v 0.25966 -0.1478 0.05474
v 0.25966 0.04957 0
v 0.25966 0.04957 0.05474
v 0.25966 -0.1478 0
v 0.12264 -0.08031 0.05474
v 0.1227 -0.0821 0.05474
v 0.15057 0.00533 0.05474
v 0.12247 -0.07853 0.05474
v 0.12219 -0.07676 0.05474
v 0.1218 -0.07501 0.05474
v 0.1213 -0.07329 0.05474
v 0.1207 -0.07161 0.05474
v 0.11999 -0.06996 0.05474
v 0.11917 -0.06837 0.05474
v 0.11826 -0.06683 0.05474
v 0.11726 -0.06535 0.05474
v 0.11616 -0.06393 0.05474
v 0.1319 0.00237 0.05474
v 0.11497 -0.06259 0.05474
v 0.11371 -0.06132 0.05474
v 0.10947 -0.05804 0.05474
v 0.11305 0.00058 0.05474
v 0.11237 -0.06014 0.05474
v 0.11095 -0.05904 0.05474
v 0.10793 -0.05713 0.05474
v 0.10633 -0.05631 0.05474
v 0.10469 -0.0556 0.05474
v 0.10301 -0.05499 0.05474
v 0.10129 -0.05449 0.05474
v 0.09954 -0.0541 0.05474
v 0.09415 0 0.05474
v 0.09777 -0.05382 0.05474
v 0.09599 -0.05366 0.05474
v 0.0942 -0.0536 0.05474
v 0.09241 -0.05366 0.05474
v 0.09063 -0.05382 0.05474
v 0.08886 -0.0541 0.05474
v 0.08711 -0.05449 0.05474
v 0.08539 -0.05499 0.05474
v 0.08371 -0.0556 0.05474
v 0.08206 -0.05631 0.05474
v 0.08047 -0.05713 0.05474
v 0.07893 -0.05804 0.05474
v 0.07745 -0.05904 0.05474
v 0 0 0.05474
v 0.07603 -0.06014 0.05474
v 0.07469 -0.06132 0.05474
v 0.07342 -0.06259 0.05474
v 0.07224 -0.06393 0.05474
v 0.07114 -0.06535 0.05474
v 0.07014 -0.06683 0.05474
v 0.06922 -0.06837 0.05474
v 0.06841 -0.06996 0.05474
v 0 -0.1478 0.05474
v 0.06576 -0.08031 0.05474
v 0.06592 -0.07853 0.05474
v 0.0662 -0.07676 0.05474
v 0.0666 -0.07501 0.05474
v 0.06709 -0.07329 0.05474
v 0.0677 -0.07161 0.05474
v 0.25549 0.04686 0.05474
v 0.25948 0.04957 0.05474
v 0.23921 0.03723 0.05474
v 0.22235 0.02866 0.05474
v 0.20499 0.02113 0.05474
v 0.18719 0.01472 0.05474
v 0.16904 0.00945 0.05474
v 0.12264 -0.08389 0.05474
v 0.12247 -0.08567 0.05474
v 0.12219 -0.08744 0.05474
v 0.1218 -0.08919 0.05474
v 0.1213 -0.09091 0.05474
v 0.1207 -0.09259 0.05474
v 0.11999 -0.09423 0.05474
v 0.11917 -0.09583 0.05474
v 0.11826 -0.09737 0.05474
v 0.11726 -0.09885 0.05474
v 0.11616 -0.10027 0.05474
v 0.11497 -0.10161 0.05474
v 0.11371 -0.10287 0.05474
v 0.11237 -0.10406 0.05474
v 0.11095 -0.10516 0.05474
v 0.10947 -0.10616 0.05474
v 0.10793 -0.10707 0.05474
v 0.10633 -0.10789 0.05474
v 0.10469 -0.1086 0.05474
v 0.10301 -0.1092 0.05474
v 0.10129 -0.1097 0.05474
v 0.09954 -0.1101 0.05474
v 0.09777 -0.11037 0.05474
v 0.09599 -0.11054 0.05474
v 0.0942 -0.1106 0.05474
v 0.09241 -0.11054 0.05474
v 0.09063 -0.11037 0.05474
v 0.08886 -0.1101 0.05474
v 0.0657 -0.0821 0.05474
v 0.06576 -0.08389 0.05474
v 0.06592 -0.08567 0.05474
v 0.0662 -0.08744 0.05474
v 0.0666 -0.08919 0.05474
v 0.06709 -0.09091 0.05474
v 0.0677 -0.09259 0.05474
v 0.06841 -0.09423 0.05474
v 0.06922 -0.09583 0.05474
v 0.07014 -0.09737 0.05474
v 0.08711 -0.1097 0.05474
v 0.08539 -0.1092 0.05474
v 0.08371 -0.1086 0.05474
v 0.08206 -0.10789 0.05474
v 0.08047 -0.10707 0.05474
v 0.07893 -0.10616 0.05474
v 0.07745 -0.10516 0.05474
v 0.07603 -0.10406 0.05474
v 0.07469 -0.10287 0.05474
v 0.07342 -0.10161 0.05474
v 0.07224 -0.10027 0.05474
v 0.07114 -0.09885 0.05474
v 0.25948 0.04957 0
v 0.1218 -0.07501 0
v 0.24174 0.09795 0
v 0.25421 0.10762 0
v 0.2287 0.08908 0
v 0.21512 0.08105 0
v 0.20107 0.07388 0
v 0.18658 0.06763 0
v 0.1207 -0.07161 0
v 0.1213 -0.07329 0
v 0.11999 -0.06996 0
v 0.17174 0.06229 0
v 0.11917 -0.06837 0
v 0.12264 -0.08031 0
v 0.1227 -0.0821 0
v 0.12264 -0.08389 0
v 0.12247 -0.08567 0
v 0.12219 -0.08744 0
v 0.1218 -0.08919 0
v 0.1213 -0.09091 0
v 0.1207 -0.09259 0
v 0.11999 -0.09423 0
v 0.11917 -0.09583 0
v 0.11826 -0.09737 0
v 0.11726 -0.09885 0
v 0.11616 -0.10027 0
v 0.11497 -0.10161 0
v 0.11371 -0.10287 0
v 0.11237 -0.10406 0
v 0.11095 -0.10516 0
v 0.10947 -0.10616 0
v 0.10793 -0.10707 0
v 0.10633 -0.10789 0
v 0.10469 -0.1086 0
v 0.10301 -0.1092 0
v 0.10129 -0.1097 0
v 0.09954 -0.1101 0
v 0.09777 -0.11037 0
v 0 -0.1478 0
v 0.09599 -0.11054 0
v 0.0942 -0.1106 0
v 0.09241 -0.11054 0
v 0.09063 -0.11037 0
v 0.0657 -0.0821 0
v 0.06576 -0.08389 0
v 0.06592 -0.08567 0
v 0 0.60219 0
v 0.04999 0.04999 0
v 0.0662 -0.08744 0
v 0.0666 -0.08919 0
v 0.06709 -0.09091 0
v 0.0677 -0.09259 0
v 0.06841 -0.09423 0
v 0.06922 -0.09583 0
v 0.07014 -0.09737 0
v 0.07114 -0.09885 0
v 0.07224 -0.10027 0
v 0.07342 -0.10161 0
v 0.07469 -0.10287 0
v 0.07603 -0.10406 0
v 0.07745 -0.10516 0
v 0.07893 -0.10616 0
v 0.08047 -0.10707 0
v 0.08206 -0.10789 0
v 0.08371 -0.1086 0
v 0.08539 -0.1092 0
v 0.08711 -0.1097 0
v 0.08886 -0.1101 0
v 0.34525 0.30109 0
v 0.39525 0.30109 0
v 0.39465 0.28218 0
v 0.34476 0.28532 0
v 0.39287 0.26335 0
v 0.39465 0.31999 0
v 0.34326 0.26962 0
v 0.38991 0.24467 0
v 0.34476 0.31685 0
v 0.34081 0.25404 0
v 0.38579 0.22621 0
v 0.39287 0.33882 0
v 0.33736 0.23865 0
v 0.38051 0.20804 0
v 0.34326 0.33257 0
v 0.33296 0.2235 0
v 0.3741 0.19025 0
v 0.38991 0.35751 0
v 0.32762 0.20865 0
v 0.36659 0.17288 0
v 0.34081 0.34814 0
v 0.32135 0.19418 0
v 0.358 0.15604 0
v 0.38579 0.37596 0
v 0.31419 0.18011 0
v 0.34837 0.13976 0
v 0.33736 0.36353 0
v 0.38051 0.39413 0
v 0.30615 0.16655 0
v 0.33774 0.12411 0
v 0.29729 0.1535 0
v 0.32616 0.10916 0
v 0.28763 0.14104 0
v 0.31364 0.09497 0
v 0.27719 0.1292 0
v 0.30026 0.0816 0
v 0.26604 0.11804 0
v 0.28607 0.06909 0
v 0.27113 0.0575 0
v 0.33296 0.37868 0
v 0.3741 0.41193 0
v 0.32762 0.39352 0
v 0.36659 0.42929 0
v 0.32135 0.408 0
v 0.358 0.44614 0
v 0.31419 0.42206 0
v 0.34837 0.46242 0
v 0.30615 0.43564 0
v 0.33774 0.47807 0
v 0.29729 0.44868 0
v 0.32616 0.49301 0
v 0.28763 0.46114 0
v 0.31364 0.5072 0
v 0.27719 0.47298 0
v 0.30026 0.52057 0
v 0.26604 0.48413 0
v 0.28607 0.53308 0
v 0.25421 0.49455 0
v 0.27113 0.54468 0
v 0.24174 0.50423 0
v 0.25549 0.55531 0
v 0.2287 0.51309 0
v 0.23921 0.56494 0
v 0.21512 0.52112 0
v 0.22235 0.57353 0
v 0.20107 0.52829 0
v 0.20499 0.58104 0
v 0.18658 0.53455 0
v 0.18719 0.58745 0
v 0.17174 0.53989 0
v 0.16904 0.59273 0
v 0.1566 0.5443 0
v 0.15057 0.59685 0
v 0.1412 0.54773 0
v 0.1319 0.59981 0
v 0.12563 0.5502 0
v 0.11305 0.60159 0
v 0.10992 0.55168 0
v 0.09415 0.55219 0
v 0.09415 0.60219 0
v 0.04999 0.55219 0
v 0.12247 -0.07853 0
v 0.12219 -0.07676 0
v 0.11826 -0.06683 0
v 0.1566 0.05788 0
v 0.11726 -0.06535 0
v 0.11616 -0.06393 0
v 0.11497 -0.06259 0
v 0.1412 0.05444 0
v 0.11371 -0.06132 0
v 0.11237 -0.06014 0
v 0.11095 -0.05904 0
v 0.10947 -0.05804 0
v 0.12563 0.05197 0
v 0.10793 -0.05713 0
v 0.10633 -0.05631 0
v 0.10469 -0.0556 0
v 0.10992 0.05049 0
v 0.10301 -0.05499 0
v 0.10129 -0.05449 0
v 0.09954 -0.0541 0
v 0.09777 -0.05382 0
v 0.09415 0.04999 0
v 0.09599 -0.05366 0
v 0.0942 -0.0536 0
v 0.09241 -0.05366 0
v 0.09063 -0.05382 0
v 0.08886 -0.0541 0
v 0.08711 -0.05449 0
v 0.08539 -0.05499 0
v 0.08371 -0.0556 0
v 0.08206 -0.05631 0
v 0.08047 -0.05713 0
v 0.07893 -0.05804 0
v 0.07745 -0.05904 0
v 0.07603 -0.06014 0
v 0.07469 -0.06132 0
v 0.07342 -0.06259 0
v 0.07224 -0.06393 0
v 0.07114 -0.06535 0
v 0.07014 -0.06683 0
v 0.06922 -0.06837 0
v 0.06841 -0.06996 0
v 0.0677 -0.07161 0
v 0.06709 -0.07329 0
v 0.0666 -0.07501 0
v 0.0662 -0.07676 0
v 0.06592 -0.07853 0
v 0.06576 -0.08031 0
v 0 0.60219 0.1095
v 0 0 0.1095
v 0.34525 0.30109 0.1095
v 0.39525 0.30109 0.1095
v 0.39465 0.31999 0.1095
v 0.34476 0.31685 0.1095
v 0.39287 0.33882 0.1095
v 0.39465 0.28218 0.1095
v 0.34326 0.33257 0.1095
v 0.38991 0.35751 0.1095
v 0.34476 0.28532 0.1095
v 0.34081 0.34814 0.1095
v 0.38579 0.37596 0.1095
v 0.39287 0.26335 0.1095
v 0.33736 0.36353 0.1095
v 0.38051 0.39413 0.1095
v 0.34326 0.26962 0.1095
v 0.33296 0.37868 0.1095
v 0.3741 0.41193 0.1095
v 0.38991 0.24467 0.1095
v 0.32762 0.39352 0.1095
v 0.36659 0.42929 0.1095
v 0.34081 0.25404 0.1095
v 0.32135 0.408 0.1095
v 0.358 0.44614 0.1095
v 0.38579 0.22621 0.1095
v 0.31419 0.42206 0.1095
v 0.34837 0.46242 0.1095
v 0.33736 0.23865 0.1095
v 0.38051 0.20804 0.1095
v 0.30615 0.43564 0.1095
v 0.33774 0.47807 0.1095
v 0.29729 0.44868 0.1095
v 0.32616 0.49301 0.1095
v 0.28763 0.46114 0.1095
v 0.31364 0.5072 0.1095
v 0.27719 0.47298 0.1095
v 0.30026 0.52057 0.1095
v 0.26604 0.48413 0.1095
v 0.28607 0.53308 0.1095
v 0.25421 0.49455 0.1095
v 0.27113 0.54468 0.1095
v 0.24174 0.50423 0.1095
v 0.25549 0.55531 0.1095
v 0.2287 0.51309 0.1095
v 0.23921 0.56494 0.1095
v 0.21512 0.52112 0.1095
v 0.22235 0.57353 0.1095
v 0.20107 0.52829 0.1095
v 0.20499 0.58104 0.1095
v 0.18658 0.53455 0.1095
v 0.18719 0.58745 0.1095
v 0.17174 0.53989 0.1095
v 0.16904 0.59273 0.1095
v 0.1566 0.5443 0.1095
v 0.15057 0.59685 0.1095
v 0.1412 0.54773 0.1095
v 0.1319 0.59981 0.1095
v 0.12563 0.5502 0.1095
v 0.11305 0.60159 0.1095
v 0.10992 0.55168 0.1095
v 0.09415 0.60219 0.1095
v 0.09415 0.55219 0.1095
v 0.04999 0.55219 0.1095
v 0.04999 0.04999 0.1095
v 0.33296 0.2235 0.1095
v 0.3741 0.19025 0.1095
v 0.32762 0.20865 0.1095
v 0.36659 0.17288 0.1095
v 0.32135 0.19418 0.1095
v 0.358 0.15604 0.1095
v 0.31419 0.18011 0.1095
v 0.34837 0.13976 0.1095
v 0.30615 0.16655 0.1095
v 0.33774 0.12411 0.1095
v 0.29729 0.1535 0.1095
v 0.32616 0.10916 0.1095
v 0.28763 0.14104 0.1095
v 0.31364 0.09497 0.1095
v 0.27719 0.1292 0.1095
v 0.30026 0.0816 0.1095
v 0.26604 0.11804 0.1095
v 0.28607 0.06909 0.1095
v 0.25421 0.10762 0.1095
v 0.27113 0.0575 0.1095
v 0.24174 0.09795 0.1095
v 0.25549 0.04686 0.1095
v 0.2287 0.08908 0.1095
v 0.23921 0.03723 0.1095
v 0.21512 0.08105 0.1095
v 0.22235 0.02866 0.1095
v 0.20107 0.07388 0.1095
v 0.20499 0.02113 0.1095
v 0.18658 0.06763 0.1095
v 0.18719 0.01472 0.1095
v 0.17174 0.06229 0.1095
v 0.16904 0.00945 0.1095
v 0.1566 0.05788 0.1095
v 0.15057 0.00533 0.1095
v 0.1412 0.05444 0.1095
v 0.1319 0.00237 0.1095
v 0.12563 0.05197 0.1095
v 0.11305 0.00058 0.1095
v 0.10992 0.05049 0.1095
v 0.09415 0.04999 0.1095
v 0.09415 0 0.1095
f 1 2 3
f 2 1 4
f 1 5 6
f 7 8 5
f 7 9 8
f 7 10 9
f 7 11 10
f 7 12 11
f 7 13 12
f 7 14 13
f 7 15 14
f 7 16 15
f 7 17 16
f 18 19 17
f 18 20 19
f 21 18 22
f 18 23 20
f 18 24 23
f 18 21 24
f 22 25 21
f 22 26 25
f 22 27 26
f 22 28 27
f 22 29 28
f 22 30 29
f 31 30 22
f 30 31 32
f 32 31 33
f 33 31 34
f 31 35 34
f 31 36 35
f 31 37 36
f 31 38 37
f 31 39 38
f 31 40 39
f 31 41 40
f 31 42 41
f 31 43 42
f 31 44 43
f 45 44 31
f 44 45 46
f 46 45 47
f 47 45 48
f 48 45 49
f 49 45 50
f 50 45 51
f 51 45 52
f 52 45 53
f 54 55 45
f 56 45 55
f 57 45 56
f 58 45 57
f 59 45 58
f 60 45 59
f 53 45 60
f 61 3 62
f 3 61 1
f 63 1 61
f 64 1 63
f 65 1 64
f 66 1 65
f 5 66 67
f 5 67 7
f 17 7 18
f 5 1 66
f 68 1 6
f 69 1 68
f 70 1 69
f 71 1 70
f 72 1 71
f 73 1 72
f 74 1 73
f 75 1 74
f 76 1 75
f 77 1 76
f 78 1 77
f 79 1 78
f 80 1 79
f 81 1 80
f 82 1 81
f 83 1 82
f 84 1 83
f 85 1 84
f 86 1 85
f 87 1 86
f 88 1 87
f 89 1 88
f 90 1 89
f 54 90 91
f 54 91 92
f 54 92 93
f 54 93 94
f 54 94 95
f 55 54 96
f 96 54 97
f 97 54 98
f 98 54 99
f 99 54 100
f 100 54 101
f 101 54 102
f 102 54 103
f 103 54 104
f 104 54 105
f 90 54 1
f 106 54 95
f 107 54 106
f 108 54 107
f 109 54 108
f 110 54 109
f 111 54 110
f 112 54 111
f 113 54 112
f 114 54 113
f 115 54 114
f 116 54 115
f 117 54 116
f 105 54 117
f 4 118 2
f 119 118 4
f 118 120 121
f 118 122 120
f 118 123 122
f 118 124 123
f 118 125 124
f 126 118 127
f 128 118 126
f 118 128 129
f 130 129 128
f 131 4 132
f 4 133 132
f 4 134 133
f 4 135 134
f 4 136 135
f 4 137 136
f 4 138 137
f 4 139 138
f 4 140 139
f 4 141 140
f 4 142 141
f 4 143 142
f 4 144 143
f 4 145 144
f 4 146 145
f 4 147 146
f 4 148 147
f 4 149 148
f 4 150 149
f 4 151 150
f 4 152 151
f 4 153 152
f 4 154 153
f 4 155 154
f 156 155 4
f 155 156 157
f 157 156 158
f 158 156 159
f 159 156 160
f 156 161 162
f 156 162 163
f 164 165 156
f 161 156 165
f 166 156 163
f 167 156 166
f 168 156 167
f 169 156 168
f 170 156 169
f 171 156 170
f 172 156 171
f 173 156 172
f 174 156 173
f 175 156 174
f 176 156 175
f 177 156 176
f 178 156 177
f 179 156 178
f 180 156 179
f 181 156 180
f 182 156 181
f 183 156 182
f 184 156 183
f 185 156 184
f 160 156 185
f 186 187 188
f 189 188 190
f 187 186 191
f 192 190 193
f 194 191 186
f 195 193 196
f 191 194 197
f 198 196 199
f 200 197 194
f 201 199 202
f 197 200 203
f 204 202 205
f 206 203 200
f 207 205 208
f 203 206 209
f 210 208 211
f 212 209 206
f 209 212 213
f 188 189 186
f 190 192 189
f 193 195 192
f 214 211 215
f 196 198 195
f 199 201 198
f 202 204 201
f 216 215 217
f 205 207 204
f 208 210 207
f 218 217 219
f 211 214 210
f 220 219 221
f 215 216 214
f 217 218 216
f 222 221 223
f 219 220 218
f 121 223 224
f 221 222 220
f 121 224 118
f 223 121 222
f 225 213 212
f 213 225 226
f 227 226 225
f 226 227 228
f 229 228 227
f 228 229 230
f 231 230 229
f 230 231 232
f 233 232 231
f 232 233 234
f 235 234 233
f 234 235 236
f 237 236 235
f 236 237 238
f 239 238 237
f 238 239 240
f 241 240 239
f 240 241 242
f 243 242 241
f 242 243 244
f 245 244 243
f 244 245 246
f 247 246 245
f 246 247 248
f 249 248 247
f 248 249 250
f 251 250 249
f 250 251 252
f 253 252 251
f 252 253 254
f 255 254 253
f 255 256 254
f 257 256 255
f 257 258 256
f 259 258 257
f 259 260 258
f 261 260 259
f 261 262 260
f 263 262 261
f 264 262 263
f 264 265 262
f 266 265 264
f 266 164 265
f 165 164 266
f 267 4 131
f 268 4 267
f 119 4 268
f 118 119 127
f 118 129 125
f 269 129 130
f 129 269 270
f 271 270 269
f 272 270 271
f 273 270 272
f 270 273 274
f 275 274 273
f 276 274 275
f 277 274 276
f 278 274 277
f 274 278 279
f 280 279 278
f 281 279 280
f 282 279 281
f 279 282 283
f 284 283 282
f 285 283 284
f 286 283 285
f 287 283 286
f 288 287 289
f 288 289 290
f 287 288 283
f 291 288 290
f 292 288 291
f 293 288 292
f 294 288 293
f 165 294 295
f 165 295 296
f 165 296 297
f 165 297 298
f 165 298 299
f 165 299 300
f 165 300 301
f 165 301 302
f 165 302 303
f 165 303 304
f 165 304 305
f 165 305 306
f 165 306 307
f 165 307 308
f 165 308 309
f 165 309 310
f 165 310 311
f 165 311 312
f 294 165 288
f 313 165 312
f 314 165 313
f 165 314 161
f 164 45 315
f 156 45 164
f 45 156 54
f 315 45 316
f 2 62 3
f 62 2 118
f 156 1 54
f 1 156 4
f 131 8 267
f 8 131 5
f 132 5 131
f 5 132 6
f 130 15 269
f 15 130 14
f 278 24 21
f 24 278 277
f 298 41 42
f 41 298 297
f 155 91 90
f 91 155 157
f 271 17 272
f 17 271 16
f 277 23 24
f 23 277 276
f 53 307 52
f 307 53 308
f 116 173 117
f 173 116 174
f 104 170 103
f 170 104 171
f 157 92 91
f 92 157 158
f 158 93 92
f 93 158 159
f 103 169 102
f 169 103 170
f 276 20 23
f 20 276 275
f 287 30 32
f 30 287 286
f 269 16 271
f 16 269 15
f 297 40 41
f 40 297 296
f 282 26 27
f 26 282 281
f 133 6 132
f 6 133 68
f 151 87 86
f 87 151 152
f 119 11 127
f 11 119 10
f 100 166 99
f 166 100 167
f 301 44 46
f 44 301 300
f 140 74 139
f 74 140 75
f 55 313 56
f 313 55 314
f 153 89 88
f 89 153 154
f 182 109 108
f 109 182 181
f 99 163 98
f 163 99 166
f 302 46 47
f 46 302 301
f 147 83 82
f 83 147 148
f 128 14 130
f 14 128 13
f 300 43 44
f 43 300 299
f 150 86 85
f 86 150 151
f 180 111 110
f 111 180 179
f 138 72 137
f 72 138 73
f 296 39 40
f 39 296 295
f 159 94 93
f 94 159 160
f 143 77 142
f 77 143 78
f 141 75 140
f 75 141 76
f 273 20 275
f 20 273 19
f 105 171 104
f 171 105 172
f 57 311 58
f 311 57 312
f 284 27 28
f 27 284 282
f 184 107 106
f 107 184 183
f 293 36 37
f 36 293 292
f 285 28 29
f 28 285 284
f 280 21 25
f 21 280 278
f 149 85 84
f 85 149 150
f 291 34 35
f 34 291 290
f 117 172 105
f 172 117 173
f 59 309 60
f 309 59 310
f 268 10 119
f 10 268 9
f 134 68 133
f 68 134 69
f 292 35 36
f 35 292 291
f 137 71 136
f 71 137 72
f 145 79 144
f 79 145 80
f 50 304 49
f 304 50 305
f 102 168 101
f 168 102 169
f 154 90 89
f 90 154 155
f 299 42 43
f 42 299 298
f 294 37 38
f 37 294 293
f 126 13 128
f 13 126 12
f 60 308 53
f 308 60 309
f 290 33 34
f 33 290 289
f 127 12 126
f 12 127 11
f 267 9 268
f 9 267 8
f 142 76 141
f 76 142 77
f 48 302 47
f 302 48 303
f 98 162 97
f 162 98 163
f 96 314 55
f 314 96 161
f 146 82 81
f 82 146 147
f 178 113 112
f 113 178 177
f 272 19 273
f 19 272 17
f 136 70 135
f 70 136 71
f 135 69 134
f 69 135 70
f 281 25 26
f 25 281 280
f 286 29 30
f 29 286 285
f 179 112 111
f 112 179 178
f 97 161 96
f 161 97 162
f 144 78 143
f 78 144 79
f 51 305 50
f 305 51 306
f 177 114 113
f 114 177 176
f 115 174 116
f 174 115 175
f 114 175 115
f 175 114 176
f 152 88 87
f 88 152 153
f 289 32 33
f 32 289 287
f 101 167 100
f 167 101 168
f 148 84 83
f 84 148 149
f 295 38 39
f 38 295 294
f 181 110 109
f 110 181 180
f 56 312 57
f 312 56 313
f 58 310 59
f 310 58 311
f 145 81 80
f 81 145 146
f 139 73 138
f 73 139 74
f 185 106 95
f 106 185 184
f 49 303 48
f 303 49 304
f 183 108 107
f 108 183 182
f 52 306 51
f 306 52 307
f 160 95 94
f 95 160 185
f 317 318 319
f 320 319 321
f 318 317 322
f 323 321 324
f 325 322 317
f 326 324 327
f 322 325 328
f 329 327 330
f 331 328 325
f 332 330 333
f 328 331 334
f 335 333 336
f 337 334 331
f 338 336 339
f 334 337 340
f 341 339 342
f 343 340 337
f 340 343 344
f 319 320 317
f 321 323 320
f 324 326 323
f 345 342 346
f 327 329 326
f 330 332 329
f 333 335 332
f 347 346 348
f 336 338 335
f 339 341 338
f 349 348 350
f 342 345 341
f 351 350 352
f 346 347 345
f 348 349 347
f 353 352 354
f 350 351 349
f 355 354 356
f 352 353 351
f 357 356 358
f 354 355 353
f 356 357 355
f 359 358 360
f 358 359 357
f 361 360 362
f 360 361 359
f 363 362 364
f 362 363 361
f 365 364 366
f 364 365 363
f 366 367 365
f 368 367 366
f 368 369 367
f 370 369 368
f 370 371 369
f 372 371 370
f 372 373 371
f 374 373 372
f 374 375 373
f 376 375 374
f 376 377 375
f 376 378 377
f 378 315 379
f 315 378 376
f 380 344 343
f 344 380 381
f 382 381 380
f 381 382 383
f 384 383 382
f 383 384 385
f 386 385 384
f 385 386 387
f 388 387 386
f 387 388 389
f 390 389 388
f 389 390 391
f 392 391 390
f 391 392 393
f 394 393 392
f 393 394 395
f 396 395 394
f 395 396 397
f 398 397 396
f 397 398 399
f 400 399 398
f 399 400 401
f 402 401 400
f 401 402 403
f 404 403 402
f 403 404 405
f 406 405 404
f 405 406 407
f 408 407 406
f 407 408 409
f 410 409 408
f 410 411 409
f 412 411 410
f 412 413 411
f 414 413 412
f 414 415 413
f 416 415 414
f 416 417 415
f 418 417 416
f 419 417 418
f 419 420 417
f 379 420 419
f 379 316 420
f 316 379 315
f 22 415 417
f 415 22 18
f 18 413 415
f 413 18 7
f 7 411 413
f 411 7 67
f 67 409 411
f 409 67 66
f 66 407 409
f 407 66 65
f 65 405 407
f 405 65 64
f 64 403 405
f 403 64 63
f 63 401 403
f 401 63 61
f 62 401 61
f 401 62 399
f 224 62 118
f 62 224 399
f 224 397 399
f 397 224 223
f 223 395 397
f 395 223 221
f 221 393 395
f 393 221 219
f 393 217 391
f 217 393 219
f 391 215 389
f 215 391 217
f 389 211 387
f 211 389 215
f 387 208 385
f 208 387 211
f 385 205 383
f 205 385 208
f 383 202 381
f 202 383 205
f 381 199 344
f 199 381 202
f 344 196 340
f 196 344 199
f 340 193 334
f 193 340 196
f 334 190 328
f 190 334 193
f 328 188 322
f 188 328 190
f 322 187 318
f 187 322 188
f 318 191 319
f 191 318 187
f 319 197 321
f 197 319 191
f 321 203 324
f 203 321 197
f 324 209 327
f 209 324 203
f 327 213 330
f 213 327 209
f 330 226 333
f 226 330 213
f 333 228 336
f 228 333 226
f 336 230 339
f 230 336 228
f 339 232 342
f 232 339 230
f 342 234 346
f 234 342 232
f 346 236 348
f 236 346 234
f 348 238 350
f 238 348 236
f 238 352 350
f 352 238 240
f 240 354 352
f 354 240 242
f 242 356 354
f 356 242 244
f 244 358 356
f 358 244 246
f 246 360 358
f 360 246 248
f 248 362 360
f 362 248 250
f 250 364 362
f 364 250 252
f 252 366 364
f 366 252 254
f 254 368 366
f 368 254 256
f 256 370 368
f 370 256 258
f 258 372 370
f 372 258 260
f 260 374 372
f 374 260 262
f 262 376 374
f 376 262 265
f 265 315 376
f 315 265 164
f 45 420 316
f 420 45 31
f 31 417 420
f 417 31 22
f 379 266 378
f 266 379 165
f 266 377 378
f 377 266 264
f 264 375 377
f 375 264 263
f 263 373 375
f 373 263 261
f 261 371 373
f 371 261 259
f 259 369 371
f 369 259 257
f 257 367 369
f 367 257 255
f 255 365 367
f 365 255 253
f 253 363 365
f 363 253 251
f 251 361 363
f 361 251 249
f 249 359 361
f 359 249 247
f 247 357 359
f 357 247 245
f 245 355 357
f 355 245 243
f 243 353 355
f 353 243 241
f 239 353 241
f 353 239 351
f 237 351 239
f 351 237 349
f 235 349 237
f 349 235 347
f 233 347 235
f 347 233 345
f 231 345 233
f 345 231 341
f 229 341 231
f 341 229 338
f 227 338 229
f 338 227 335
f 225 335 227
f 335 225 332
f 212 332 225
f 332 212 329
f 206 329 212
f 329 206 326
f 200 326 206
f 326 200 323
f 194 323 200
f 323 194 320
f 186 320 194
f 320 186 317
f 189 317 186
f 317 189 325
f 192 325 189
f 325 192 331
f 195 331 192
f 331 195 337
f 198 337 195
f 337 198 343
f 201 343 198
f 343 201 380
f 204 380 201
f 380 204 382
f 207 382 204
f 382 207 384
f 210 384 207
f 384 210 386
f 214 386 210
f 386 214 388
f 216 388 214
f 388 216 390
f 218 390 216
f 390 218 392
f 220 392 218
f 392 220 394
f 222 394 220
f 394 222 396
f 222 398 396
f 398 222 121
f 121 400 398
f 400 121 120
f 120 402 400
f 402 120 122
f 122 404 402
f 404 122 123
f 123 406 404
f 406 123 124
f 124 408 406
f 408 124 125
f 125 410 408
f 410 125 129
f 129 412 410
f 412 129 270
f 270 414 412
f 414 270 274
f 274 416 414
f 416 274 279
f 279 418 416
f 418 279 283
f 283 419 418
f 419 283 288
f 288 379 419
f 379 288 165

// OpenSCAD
// ==========================================
// Parametric D-Frame with Round Protrusion
// ==========================================

$fn = 100;

// --- Main Base Dimensions ---
base_length = 0.395255;   // Overall length (x)
base_width  = 0.60219;    // Overall width (y)
base_height = 0.1095;     // Full extrusion depth (z)

// --- Frame Wall Thickness ---
wall_thickness = 0.05;    // Parametric wall thickness for D-frame

// --- Derived D-Shape Geometry ---
arc_radius = base_width / 2;              // Outer semicircle radius
flat_length = base_length - arc_radius;   // Straight rear segment length
inner_arc_radius = arc_radius - wall_thickness;

// --- Protrusion Footprint ---
protrusion_length = 0.259658;
protrusion_width  = 0.197373;
protrusion_height = 0.054745;
protrusion_left   = 0.0;
protrusion_front  = -0.1478;   // Relative to main base front edge (y=0)

// --- Round Tab ---
round_center_left  = 0.0942;
round_center_front = -0.0821;
round_radius = 0.0657;

// --- Concentric Hole in Tab ---
hole_radius = 0.0285;
hole_height = protrusion_height + 0.002;  // Overcut for clean difference

// ==========================================
// Helper: Generate arc points (degrees)
// ==========================================
function arc_points(center, r, start_angle, end_angle, n = 50) = 
    [for (i = [0:n]) 
        let(a = start_angle + (end_angle - start_angle) * i / n)
        [center[0] + r * cos(a), center[1] + r * sin(a)]
    ];

// ==========================================
// 2D D-Frame Profile (outer minus inner)
// ==========================================
module d_frame_profile() {
    // Outer D-shape: straight rear, sides, and rounded arc wall
    outer_pts = concat(
        [[0, 0], [flat_length, 0]],
        arc_points([flat_length, base_width / 2], arc_radius, -90, 90),
        [[flat_length, base_width], [0, base_width]]
    );

    // Inner through-opening: concentric offset D-shape
    inner_pts = concat(
        [[wall_thickness, wall_thickness], [flat_length, wall_thickness]],
        arc_points([flat_length, base_width / 2], inner_arc_radius, -90, 90),
        [[flat_length, base_width - wall_thickness], [wall_thickness, base_width - wall_thickness]]
    );

    difference() {
        polygon(outer_pts);
        polygon(inner_pts);
    }
}

// ==========================================
// Main Full-Depth Frame
// ==========================================
module main_frame() {
    linear_extrude(height = base_height, convexity = 4)
        d_frame_profile();
}

// ==========================================
// Shallow Protrusion with Round Tab and Hole
// ==========================================
module protrusion() {
    difference() {
        union() {
            // Rectangular footprint block
            translate([protrusion_left, protrusion_front, 0])
                cube([protrusion_length, protrusion_width, protrusion_height]);

            // Coaxial cylindrical round portion
            translate([round_center_left, round_center_front, 0])
                cylinder(h = protrusion_height, r = round_radius);
        }

        // Concentric circular cut through shallow band
        translate([round_center_left, round_center_front, -0.001])
            cylinder(h = hole_height, r = hole_radius);
    }
}

// ==========================================
// Final Assembly
// ==========================================
union() {
    main_frame();
    protrusion();
}
